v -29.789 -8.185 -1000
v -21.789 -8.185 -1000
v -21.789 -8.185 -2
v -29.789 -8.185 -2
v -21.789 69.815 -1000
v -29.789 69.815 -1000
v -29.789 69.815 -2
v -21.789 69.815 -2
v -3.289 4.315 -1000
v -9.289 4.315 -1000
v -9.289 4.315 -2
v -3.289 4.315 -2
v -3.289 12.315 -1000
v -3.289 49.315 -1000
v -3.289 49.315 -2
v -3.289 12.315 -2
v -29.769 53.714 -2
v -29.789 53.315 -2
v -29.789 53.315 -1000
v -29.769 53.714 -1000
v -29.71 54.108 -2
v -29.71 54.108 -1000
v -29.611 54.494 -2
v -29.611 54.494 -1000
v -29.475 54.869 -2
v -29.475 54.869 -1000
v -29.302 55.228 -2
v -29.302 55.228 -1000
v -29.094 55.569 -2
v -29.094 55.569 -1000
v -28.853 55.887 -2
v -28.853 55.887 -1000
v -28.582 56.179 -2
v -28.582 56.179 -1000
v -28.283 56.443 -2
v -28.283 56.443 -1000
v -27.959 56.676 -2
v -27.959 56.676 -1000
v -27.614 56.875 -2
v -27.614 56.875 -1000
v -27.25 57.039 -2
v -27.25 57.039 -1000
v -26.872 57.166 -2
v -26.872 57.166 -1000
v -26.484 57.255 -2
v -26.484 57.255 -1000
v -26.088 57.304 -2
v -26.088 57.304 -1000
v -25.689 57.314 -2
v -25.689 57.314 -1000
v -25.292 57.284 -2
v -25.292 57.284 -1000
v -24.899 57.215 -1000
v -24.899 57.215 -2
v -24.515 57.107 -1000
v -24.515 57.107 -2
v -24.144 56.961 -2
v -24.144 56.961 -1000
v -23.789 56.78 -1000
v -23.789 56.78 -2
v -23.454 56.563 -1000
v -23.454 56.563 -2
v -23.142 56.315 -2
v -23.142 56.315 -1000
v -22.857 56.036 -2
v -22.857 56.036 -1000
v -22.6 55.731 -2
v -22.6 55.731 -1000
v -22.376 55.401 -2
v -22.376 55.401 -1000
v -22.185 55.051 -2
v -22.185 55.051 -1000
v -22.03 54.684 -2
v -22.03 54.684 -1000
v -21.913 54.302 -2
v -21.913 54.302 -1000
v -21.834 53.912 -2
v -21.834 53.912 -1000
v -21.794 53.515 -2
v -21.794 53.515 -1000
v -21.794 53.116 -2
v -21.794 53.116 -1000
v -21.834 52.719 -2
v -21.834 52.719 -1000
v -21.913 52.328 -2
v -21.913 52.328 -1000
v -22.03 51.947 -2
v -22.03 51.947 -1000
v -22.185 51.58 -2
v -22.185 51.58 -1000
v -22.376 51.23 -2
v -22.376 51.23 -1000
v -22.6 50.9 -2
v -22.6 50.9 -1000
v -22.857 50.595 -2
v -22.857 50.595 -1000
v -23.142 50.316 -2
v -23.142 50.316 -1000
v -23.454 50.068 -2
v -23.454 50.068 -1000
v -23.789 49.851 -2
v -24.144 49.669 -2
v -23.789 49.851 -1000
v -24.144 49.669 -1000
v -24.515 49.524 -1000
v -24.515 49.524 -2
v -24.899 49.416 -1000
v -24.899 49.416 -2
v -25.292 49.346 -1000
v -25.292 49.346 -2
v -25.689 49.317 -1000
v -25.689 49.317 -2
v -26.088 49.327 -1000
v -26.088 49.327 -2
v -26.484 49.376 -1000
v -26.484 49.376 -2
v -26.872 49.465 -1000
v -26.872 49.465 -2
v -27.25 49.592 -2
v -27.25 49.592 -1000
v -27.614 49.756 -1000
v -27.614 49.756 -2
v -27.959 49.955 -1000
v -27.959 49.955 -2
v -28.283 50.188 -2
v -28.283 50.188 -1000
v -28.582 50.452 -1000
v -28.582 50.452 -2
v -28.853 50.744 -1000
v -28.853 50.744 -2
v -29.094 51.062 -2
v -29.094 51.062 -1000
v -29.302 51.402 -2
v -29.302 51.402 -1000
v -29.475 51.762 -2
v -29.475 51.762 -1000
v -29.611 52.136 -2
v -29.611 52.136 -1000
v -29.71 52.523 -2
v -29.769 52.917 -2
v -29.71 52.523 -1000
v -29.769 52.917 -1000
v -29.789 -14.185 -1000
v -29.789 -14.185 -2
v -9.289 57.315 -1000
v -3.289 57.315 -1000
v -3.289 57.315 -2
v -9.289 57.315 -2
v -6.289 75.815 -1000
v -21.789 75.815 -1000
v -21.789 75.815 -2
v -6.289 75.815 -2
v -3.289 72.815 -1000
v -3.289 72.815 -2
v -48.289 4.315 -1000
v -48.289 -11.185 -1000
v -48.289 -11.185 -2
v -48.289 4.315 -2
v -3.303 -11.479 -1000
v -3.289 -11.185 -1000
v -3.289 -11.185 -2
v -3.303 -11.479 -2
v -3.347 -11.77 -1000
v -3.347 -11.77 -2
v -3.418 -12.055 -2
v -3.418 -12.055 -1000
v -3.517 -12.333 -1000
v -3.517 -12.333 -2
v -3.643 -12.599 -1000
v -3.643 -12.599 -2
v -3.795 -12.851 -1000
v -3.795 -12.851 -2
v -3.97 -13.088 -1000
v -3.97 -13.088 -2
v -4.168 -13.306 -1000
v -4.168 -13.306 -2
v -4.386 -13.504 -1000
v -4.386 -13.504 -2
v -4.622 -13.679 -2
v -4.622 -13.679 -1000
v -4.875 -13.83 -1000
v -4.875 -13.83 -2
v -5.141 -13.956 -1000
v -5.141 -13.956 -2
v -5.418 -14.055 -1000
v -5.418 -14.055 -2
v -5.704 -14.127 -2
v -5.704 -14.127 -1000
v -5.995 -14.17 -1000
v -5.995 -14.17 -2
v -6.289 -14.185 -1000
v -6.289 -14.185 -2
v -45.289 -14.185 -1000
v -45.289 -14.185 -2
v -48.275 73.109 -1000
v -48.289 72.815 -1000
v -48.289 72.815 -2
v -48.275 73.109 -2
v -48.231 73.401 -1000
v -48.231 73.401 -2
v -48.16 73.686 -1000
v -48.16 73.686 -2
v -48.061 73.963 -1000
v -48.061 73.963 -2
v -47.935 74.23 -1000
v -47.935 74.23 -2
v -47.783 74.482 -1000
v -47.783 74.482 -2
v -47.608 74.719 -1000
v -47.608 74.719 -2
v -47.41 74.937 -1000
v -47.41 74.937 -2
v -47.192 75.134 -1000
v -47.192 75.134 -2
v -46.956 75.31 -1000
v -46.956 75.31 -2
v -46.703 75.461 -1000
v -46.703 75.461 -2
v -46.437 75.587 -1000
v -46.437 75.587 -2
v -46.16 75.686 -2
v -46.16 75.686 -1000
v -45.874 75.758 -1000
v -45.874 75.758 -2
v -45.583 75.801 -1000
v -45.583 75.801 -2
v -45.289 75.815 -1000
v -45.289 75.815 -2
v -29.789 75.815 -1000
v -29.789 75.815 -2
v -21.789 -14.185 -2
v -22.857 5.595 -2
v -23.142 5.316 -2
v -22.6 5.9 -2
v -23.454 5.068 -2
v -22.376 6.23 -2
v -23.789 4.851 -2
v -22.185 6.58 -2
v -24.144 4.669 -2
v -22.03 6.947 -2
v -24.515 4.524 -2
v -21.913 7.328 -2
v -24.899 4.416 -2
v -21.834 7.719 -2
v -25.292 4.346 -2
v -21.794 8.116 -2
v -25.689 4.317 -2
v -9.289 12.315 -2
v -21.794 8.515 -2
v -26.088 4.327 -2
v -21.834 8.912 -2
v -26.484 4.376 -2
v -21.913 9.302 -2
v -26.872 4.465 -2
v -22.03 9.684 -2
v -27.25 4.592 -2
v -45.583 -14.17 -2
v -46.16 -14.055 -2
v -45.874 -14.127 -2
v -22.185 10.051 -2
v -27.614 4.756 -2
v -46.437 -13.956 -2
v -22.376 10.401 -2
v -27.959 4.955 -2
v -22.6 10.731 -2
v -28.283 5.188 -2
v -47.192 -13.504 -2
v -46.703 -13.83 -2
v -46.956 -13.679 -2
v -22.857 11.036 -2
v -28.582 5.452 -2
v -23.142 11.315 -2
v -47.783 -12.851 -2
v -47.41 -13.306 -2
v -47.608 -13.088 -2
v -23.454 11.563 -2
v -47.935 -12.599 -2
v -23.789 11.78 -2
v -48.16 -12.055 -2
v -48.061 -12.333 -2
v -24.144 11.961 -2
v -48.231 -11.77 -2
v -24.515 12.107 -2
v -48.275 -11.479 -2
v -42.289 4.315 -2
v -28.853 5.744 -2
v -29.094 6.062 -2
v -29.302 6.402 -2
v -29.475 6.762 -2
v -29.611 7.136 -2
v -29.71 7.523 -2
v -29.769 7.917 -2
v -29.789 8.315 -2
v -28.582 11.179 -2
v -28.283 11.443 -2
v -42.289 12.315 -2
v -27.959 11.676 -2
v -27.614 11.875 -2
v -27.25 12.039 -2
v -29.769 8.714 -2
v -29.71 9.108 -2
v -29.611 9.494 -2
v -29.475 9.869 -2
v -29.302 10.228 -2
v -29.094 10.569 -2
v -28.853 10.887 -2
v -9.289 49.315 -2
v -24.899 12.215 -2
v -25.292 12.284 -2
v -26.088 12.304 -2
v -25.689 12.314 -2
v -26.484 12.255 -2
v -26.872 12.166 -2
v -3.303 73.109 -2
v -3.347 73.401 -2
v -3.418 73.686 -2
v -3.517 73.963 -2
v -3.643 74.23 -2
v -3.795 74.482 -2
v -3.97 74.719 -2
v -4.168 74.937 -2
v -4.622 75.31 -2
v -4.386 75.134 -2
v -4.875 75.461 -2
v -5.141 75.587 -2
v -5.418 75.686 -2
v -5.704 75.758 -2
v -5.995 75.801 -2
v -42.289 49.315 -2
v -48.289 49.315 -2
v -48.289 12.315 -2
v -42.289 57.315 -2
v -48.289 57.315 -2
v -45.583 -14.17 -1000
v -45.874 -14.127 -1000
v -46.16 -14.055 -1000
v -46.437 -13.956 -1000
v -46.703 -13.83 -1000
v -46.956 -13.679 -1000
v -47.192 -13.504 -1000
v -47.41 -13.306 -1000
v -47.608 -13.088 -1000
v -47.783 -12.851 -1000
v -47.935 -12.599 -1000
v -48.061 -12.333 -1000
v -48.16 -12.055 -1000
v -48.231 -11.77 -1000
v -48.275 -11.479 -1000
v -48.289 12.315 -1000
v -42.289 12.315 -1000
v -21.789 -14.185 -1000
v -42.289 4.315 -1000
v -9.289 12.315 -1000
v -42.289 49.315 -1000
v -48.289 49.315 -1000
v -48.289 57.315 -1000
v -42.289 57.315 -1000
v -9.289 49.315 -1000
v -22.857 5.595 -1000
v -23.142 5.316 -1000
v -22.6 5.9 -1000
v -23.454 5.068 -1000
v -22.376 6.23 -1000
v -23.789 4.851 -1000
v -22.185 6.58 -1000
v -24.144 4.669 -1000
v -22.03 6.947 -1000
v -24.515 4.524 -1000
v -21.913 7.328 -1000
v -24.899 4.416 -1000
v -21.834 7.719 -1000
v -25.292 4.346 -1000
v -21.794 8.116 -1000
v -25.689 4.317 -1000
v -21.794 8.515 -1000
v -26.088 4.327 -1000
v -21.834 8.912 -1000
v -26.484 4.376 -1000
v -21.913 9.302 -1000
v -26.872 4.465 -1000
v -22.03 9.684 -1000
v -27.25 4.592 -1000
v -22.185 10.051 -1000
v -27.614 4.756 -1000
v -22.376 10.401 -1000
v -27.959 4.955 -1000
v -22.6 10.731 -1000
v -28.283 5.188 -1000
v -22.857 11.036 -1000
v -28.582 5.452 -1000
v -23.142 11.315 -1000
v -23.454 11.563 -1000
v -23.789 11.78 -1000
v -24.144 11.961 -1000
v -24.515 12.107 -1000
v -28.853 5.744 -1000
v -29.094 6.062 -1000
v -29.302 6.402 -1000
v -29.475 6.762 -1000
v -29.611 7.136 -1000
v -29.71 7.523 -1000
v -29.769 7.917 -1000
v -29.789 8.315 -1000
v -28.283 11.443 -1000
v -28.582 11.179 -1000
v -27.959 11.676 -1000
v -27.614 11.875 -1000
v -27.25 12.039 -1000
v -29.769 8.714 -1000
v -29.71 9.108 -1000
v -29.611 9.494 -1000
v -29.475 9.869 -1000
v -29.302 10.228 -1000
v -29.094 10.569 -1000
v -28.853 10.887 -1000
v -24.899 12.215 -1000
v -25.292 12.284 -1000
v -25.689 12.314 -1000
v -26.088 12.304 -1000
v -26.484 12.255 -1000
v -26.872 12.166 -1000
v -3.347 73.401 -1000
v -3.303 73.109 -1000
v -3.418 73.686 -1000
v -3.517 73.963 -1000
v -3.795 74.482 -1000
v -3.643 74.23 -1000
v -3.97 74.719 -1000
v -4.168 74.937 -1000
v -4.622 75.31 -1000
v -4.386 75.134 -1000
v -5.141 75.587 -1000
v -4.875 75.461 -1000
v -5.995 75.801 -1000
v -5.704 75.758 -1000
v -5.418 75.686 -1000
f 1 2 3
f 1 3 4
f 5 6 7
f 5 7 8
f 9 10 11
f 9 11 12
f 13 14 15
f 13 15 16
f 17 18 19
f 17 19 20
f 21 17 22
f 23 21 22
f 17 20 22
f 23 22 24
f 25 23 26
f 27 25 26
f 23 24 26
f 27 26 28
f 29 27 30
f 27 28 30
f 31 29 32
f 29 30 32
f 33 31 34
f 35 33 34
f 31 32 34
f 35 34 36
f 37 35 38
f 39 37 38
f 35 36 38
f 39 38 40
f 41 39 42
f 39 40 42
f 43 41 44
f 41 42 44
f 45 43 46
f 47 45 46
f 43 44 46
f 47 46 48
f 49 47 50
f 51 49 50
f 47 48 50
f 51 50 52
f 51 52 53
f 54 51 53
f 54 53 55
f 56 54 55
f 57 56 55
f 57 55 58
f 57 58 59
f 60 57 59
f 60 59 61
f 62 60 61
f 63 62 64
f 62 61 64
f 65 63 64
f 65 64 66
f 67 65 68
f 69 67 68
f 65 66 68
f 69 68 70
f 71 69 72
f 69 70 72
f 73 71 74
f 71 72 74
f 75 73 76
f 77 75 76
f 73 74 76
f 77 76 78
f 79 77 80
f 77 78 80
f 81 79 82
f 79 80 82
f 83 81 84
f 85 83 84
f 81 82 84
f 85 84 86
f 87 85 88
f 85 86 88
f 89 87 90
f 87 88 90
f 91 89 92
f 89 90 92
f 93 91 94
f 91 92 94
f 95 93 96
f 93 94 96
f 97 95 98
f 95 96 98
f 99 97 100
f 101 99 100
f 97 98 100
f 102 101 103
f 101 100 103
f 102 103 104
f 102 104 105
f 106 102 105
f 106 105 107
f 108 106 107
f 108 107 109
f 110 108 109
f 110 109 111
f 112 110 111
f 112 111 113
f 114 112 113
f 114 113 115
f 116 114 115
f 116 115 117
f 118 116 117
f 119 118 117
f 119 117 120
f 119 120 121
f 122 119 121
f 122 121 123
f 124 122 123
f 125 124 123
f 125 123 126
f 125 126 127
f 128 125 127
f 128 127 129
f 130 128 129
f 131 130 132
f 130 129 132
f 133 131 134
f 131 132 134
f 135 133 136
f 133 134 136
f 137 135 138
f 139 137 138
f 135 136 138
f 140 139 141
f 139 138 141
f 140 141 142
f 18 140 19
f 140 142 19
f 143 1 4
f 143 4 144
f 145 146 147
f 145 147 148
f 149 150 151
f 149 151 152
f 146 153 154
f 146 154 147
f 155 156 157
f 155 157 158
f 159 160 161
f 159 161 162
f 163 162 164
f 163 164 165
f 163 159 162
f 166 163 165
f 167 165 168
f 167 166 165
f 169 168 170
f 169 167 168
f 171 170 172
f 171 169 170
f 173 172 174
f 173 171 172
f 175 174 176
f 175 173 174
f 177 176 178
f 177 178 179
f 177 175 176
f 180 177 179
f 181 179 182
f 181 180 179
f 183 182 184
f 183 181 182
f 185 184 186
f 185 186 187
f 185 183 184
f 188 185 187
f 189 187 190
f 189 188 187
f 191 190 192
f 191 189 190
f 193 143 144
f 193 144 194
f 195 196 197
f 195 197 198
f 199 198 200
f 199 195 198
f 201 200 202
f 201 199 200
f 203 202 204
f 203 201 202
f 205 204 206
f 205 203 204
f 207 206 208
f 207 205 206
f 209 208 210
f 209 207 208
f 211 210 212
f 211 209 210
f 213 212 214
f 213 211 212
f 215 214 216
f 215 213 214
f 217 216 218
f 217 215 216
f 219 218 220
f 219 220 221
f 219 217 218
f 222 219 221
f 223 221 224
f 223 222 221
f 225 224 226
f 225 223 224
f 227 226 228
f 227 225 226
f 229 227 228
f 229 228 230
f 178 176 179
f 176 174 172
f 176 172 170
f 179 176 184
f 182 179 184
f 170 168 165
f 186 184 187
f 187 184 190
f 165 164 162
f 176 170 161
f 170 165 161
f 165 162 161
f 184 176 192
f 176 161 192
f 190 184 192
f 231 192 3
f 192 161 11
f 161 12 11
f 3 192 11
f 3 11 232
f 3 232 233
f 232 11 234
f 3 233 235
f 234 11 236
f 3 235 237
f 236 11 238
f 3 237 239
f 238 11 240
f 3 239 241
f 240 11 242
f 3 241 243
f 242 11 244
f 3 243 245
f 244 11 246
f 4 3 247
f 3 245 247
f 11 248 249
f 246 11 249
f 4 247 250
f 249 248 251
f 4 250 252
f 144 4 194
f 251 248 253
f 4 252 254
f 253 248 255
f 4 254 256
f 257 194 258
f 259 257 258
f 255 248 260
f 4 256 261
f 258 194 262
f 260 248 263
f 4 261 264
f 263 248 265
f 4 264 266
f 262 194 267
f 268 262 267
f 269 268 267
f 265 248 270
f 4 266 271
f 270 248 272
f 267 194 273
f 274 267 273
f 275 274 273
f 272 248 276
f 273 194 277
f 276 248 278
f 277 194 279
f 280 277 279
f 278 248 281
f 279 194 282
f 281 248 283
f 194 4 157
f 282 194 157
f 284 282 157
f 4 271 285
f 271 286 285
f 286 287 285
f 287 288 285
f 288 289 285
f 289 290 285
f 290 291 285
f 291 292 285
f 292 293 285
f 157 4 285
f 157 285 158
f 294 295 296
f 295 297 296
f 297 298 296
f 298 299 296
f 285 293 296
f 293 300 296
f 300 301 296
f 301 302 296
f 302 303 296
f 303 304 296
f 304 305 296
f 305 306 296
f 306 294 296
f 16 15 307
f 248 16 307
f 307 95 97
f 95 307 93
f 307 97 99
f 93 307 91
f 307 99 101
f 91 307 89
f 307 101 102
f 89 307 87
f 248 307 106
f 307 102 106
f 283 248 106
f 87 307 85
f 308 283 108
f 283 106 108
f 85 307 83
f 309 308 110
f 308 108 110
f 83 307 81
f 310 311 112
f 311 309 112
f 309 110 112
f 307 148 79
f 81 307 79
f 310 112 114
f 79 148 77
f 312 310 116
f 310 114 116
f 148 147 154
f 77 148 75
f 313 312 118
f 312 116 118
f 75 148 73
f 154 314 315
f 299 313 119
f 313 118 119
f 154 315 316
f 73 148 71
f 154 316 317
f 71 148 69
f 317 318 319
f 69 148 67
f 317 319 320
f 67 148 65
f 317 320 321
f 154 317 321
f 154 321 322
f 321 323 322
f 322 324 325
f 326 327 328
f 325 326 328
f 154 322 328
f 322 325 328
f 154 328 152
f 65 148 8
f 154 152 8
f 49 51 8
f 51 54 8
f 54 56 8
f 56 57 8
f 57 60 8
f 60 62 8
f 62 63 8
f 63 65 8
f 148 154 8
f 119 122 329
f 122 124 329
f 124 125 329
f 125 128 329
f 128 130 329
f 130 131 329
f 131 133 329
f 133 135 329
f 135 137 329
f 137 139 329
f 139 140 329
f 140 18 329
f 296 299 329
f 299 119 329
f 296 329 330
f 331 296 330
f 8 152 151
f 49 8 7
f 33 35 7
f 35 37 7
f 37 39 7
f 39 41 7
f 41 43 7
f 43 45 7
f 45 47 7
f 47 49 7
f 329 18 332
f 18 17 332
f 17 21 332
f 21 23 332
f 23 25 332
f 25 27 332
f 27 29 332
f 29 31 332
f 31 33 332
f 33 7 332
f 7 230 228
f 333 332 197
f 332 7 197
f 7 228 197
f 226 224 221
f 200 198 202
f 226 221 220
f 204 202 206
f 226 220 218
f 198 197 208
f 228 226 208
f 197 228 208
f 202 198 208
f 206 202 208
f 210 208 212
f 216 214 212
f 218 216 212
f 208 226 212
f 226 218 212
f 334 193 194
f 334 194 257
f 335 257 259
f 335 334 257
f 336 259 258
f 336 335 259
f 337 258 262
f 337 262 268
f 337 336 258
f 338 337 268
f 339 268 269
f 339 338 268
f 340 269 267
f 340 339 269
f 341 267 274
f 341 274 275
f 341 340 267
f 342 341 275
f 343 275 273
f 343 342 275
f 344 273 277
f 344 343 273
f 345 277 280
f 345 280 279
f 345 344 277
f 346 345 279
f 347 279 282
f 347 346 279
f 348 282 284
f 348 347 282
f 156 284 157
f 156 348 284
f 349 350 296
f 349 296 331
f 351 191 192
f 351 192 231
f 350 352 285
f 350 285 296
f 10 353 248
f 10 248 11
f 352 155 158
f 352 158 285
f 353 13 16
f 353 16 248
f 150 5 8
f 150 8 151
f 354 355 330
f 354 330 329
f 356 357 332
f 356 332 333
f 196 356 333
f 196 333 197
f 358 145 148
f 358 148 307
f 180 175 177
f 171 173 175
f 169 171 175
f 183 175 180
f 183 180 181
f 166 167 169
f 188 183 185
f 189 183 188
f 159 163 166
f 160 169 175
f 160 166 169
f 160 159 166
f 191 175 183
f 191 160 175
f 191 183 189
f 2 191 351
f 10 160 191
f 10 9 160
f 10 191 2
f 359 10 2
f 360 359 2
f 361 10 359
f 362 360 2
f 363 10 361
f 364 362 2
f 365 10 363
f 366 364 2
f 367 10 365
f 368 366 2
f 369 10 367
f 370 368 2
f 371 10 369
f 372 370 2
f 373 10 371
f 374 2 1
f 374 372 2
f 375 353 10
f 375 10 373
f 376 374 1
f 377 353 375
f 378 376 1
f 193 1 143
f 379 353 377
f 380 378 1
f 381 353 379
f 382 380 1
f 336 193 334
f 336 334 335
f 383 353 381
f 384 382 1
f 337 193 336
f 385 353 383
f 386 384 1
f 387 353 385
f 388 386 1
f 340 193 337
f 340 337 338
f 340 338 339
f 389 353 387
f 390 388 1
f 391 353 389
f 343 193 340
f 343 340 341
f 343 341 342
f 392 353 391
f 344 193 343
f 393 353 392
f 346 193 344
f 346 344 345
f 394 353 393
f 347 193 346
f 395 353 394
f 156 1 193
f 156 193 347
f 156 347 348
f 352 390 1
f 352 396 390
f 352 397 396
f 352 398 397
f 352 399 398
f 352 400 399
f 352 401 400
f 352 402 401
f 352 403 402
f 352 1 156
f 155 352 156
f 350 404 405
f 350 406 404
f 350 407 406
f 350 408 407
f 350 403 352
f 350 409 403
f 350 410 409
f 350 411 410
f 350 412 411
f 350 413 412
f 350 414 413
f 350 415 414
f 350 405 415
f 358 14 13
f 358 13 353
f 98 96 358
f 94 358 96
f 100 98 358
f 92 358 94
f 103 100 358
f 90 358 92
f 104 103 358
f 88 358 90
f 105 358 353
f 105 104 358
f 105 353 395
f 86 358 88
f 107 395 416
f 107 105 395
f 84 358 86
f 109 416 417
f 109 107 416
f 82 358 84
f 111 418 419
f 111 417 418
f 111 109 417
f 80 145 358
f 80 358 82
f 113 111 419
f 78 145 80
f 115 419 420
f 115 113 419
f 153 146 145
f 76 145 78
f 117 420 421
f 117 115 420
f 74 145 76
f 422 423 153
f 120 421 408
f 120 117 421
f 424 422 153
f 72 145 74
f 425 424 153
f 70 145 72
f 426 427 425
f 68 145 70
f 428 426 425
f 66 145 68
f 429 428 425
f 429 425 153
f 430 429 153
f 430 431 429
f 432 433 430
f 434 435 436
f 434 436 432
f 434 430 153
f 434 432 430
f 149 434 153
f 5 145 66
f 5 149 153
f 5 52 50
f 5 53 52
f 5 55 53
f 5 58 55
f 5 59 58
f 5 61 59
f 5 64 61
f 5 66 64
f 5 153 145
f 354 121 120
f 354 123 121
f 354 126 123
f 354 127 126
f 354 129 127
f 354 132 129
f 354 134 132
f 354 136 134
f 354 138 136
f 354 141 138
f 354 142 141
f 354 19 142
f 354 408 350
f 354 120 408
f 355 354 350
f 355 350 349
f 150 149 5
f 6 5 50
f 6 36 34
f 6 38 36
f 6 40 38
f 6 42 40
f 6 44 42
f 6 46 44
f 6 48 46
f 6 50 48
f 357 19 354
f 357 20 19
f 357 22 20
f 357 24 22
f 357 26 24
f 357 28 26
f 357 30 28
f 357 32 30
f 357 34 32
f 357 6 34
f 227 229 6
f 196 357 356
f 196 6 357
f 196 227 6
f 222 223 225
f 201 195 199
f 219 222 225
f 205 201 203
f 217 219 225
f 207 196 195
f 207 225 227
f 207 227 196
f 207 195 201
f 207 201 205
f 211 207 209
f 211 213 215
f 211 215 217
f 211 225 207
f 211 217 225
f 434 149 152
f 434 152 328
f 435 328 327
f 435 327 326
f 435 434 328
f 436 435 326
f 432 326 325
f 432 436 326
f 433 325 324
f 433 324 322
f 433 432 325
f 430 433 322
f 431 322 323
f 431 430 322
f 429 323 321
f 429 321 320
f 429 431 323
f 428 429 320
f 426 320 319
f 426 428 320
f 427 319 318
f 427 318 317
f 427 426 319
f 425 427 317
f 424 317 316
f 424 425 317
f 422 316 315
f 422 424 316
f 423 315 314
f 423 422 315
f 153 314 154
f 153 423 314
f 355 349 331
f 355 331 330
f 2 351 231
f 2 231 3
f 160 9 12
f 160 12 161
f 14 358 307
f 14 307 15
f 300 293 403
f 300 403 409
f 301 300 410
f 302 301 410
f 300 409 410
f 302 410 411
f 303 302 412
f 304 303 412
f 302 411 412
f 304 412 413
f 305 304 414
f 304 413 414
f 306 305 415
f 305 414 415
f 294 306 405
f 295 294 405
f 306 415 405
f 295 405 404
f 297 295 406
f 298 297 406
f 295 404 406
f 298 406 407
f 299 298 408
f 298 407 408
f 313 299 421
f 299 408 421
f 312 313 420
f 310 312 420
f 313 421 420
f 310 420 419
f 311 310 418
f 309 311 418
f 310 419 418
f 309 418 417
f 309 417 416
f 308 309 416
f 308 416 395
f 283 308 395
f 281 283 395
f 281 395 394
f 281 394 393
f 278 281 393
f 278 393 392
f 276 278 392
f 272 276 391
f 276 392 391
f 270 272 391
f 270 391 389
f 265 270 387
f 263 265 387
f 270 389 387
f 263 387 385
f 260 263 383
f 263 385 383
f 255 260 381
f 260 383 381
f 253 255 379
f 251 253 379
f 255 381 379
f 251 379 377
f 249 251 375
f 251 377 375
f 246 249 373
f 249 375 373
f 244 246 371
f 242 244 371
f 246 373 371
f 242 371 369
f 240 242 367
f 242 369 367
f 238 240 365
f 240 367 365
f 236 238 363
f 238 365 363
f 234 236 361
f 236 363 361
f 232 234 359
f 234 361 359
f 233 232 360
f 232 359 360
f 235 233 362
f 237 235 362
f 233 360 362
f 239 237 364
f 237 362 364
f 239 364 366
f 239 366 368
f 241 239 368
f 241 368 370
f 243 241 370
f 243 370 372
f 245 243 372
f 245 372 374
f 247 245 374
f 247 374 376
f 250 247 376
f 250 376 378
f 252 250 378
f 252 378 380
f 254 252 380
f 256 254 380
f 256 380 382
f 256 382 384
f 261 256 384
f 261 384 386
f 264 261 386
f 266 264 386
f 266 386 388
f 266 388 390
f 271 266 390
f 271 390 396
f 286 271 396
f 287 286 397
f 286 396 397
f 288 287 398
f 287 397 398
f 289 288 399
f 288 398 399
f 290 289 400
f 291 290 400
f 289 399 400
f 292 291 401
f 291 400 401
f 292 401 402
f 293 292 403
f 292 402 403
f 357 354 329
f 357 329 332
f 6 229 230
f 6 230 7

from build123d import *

# Parameters (mm, degrees)
ESQUISSE1_R        = 4
BOSS_EXTRU_1_DEPTH = 998


with BuildPart() as part:
    # Esquisse1 → Boss.-Extru.1 (new body)
    with BuildSketch(Plane(origin=(0, 0, -1000), x_dir=(-1, 0, 0), z_dir=(0, 0, -1))):
        with BuildLine():
            Line((42.288948628, 57.315448094), (48.288948628, 57.315448094))
            Line((48.288948628, 57.315448094), (48.288948628, 72.815448094))
            ThreePointArc((48.288948628, 72.815448094), (47.410268972, 74.936768437), (45.288948628, 75.815448094))
            Line((45.288948628, 75.815448094), (29.788948628, 75.815448094))
            Line((29.788948628, 75.815448094), (29.788948628, 69.815448094))
            Line((29.788948628, 69.815448094), (21.788948628, 69.815448094))
            Line((21.788948628, 69.815448094), (21.788948628, 75.815448094))
            Line((21.788948628, 75.815448094), (6.288948628, 75.815448094))
            ThreePointArc((6.288948628, 75.815448094), (4.167628284, 74.936768437), (3.288948628, 72.815448094))
            Line((3.288948628, 72.815448094), (3.288948628, 57.315448094))
            Line((3.288948628, 57.315448094), (9.288948628, 57.315448094))
            Line((9.288948628, 57.315448094), (9.288948628, 49.315448094))
            Line((9.288948628, 49.315448094), (3.288948628, 49.315448094))
            Line((3.288948628, 49.315448094), (3.288948628, 12.315448094))
            Line((3.288948628, 12.315448094), (9.288948628, 12.315448094))
            Line((9.288948628, 12.315448094), (9.288948628, 4.315448094))
            Line((9.288948628, 4.315448094), (3.288948628, 4.315448094))
            Line((3.288948628, 4.315448094), (3.288948628, -11.184551906))
            ThreePointArc((3.288948628, -11.184551906), (4.167628284, -13.30587225), (6.288948628, -14.184551906))
            Line((6.288948628, -14.184551906), (21.788948628, -14.184551906))
            Line((21.788948628, -14.184551906), (21.788948628, -8.184551906))
            Line((21.788948628, -8.184551906), (29.788948628, -8.184551906))
            Line((29.788948628, -8.184551906), (29.788948628, -14.184551906))
            Line((29.788948628, -14.184551906), (45.288948628, -14.184551906))
            ThreePointArc((45.288948628, -14.184551906), (47.410268972, -13.30587225), (48.288948628, -11.184551906))
            Line((48.288948628, -11.184551906), (48.288948628, 4.315448094))
            Line((48.288948628, 4.315448094), (42.288948628, 4.315448094))
            Line((42.288948628, 4.315448094), (42.288948628, 12.315448094))
            Line((42.288948628, 12.315448094), (48.288948628, 12.315448094))
            Line((48.288948628, 12.315448094), (48.288948628, 49.315448094))
            Line((48.288948628, 49.315448094), (42.288948628, 49.315448094))
            Line((42.288948628, 49.315448094), (42.288948628, 57.315448094))
        make_face()
        with Locations((25.788948628, 53.315448094)):
            Circle(ESQUISSE1_R, mode=Mode.SUBTRACT)
        with Locations((25.788948628, 8.315448094)):
            Circle(ESQUISSE1_R, mode=Mode.SUBTRACT)
    extrude(amount=-BOSS_EXTRU_1_DEPTH)


solid = part.part
